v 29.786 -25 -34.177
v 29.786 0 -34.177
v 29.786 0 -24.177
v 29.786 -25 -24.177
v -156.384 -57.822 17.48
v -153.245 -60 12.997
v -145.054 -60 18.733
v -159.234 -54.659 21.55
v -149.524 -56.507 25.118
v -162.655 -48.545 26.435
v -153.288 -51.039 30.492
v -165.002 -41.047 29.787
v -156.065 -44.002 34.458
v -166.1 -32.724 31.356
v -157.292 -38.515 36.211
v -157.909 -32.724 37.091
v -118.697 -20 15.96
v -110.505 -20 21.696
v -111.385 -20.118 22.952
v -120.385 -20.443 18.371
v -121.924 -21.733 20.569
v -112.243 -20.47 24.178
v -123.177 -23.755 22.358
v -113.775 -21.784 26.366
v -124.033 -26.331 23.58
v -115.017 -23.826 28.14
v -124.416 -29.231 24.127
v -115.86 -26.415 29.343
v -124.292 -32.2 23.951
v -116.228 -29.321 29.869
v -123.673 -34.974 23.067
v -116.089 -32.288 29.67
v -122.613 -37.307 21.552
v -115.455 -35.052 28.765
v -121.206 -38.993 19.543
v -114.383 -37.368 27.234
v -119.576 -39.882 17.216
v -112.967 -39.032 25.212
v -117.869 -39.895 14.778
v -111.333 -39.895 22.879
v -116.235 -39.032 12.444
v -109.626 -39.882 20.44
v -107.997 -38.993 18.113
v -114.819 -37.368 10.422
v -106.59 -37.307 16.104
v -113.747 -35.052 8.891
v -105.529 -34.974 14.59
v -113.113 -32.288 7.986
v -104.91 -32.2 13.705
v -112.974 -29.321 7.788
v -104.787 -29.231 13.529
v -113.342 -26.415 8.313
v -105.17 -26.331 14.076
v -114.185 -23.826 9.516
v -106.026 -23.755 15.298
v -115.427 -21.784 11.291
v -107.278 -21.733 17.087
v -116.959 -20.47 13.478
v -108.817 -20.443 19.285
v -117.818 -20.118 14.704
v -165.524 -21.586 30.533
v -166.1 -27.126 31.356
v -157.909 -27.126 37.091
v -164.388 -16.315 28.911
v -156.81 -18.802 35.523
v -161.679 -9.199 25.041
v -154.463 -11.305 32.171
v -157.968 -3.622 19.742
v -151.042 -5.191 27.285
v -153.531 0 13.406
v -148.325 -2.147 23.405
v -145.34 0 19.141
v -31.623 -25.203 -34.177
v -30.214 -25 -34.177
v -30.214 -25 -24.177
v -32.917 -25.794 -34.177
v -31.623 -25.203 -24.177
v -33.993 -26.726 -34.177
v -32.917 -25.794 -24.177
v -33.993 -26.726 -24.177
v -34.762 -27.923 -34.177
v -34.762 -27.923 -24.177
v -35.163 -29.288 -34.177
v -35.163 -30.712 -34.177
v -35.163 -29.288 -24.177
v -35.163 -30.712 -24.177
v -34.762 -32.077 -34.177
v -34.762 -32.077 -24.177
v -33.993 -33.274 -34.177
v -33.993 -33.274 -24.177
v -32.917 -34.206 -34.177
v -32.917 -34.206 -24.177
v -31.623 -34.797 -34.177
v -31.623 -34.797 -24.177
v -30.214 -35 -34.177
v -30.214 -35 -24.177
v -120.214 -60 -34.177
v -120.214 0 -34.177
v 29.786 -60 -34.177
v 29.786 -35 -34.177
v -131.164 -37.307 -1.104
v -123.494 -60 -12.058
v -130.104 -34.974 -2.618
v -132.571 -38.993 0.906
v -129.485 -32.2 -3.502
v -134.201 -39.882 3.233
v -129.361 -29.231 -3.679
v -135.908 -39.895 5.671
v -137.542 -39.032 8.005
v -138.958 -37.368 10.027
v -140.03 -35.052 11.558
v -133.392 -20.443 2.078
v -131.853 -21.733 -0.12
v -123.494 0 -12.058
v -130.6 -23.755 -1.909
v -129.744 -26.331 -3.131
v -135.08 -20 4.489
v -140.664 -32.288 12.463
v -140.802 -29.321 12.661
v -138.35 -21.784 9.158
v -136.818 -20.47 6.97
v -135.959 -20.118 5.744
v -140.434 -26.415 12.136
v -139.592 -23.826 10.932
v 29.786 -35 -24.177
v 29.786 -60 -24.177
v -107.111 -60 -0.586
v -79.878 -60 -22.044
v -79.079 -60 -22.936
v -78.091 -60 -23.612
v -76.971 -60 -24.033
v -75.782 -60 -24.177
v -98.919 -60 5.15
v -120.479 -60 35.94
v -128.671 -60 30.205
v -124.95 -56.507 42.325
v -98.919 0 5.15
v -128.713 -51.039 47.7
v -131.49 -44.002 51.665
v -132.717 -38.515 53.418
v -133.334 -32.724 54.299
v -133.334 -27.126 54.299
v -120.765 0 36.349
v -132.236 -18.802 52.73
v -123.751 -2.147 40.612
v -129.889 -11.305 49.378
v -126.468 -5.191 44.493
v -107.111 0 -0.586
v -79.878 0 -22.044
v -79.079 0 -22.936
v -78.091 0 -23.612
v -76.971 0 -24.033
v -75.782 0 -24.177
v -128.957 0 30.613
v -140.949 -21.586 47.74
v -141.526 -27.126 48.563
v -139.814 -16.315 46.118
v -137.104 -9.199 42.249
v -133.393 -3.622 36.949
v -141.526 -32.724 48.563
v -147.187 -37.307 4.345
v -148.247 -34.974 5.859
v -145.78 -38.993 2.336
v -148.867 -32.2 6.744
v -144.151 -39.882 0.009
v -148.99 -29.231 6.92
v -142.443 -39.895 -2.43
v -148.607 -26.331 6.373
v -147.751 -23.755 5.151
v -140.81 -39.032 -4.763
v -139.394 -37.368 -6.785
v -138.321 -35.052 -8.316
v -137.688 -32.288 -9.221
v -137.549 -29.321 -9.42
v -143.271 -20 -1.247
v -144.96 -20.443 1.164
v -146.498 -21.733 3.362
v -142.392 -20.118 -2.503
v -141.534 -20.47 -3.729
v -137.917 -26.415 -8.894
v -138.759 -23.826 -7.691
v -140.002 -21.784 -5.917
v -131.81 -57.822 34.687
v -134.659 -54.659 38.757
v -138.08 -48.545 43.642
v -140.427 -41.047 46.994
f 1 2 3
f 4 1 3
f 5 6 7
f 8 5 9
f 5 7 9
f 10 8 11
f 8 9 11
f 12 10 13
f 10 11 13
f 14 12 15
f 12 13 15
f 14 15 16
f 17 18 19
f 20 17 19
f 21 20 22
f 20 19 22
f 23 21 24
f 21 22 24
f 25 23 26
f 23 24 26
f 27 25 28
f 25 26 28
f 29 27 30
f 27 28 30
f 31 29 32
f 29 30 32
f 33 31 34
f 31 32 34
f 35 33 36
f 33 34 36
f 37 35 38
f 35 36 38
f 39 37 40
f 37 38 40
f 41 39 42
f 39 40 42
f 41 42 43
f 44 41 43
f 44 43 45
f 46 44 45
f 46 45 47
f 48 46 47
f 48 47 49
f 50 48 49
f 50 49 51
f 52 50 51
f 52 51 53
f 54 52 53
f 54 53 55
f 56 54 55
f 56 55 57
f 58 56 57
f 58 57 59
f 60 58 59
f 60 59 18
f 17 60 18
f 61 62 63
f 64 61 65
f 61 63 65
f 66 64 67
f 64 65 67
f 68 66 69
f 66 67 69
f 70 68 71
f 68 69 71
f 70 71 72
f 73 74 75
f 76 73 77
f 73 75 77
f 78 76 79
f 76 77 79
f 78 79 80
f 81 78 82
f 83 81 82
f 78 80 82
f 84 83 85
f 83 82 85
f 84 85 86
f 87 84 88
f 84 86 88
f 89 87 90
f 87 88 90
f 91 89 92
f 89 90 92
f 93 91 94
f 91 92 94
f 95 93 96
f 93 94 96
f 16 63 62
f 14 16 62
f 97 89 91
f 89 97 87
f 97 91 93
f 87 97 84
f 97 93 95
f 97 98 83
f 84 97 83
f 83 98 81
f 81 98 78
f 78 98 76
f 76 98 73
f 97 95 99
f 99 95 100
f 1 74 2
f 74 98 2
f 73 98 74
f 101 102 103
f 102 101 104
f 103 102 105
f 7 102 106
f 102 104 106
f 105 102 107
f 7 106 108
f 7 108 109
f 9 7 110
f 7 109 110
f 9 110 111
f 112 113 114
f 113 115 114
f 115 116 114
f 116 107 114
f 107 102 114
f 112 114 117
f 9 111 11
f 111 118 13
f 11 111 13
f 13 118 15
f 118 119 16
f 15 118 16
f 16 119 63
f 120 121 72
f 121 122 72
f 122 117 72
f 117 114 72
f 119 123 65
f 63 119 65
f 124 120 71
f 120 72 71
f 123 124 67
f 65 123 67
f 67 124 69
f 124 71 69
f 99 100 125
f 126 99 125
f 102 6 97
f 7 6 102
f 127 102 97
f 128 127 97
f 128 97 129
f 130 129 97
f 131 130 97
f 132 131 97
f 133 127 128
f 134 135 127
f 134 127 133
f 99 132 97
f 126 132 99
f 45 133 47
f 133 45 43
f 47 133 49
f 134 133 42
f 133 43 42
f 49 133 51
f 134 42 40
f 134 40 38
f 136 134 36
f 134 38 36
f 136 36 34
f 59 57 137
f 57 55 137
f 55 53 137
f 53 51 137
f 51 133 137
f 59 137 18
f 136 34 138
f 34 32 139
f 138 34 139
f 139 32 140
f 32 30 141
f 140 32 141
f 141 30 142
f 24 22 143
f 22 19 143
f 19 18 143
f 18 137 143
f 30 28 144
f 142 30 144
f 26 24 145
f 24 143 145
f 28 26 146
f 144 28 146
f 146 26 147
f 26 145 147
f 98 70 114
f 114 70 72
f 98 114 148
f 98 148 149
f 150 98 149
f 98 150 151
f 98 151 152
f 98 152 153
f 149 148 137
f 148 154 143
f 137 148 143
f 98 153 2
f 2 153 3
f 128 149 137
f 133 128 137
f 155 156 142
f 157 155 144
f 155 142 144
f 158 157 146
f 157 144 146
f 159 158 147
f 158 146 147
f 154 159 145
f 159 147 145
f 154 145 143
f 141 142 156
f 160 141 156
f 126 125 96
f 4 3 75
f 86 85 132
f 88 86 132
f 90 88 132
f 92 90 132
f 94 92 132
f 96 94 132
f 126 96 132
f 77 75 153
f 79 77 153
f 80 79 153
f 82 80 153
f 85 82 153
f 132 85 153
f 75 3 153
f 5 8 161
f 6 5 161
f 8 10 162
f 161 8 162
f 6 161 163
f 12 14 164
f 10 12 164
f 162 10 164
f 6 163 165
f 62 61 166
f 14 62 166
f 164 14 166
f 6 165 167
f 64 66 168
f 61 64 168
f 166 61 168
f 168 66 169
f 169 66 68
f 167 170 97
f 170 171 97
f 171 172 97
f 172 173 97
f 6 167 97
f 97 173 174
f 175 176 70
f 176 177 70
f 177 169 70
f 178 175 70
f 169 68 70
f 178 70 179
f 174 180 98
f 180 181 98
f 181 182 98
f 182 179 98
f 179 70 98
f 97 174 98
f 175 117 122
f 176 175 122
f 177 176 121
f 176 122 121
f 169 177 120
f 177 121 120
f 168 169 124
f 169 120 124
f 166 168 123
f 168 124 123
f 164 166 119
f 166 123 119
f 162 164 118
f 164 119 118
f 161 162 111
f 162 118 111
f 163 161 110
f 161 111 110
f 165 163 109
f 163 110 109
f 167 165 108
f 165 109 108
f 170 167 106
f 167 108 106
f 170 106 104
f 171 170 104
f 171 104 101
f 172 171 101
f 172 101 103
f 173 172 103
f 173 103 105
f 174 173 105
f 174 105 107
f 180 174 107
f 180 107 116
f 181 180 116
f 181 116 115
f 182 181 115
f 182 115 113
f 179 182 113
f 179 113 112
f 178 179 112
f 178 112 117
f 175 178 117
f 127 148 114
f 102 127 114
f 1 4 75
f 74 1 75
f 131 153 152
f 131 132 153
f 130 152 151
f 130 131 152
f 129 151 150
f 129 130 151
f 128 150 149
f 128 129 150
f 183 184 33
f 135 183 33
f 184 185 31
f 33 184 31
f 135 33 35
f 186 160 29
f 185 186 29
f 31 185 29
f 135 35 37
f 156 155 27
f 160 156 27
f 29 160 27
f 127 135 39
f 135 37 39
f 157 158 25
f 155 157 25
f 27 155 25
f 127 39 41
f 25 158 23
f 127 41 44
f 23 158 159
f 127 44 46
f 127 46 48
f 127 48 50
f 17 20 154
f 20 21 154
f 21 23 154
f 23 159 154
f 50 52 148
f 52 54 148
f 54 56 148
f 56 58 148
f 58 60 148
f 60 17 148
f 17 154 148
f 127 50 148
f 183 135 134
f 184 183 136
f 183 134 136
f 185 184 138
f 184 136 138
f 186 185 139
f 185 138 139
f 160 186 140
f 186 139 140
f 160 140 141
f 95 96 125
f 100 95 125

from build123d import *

# Parameters (mm, degrees)
F1_DEPTH = 60
F3_DEPTH = 77.588705
F4_R     = 10
F5_DEPTH = 52.1
F7_DEPTH = 25
F8_R     = 5


with BuildPart() as f1:
    # F0 (on Front) → F1 (new body)
    with BuildSketch(Plane.XZ):
        Polygon((-120.213985, -34.176537), (29.786015, -34.176537), (29.786015, -24.176537), (-78.385077, -24.176537), (-98.919432, 5.149562), (-133.334018, 54.298684), (-141.525538, 48.56292), (-107.110952, -0.586203), (-123.493993, -12.057731), (-157.908579, 37.091391), (-166.1001, 31.355627), align=None)
    extrude(amount=F1_DEPTH)

    # F2 (on face) → F3 (cut, through all)
    with BuildSketch(Plane(origin=(-63.956432, 0, -44.782776), x_dir=(0, 1, 0), z_dir=(0.819152, 0, 0.573576))):
        with BuildLine():
            ThreePointArc((-60, 80.946133), (-29.664459, 121.080285), (0, 80.447599))
            Line((0, 80.447599), (29.212171, 131.16917))
            Line((29.212171, 131.16917), (-70.869207, 149.550825))
            Line((-70.869207, 149.550825), (-73.535636, 96.864909))
            Line((-73.535636, 96.864909), (-60, 80.946133))
        make_face()
    extrude(amount=-F3_DEPTH, mode=Mode.SUBTRACT)

    # F4 (on face) → F5 (cut)
    with BuildSketch(Plane(origin=(-63.956432, 0, -44.782776), x_dir=(0, 1, 0), z_dir=(0.819152, 0, 0.573576))):
        with Locations((-30, 81.155573)):
            Circle(F4_R)
    extrude(amount=-F5_DEPTH, mode=Mode.SUBTRACT)

    # F6 (on face) → F7 (cut)
    with BuildSketch(Plane.XY.offset(-24.176537)):
        with BuildLine():
            ThreePointArc((-30.213985, -35), (-26.678451, -33.535534), (-25.213985, -30))
            ThreePointArc((-25.213985, -30), (-26.678451, -26.464466), (-30.213985, -25))
            ThreePointArc((-30.213985, -25), (-35.213985, -30), (-30.213985, -35))
        make_face()
        with BuildLine():
            ThreePointArc((-30.213985, -25), (-26.678451, -26.464466), (-25.213985, -30))
            ThreePointArc((-25.213985, -30), (-26.678451, -33.535534), (-30.213985, -35))
            Line((-30.213985, -35), (33.633854, -35))
            Line((33.633854, -35), (34.827039, -25))
            Line((34.827039, -25), (-30.213985, -25))
        make_face()
    extrude(amount=-F7_DEPTH, mode=Mode.SUBTRACT)

    # F8
    f8_edges = [f1.edges().sort_by_distance(p)[0] for p in [
        (-78.385077, -30, -24.176537),
    ]]
    fillet(f8_edges, radius=F8_R)


solid = f1.part
